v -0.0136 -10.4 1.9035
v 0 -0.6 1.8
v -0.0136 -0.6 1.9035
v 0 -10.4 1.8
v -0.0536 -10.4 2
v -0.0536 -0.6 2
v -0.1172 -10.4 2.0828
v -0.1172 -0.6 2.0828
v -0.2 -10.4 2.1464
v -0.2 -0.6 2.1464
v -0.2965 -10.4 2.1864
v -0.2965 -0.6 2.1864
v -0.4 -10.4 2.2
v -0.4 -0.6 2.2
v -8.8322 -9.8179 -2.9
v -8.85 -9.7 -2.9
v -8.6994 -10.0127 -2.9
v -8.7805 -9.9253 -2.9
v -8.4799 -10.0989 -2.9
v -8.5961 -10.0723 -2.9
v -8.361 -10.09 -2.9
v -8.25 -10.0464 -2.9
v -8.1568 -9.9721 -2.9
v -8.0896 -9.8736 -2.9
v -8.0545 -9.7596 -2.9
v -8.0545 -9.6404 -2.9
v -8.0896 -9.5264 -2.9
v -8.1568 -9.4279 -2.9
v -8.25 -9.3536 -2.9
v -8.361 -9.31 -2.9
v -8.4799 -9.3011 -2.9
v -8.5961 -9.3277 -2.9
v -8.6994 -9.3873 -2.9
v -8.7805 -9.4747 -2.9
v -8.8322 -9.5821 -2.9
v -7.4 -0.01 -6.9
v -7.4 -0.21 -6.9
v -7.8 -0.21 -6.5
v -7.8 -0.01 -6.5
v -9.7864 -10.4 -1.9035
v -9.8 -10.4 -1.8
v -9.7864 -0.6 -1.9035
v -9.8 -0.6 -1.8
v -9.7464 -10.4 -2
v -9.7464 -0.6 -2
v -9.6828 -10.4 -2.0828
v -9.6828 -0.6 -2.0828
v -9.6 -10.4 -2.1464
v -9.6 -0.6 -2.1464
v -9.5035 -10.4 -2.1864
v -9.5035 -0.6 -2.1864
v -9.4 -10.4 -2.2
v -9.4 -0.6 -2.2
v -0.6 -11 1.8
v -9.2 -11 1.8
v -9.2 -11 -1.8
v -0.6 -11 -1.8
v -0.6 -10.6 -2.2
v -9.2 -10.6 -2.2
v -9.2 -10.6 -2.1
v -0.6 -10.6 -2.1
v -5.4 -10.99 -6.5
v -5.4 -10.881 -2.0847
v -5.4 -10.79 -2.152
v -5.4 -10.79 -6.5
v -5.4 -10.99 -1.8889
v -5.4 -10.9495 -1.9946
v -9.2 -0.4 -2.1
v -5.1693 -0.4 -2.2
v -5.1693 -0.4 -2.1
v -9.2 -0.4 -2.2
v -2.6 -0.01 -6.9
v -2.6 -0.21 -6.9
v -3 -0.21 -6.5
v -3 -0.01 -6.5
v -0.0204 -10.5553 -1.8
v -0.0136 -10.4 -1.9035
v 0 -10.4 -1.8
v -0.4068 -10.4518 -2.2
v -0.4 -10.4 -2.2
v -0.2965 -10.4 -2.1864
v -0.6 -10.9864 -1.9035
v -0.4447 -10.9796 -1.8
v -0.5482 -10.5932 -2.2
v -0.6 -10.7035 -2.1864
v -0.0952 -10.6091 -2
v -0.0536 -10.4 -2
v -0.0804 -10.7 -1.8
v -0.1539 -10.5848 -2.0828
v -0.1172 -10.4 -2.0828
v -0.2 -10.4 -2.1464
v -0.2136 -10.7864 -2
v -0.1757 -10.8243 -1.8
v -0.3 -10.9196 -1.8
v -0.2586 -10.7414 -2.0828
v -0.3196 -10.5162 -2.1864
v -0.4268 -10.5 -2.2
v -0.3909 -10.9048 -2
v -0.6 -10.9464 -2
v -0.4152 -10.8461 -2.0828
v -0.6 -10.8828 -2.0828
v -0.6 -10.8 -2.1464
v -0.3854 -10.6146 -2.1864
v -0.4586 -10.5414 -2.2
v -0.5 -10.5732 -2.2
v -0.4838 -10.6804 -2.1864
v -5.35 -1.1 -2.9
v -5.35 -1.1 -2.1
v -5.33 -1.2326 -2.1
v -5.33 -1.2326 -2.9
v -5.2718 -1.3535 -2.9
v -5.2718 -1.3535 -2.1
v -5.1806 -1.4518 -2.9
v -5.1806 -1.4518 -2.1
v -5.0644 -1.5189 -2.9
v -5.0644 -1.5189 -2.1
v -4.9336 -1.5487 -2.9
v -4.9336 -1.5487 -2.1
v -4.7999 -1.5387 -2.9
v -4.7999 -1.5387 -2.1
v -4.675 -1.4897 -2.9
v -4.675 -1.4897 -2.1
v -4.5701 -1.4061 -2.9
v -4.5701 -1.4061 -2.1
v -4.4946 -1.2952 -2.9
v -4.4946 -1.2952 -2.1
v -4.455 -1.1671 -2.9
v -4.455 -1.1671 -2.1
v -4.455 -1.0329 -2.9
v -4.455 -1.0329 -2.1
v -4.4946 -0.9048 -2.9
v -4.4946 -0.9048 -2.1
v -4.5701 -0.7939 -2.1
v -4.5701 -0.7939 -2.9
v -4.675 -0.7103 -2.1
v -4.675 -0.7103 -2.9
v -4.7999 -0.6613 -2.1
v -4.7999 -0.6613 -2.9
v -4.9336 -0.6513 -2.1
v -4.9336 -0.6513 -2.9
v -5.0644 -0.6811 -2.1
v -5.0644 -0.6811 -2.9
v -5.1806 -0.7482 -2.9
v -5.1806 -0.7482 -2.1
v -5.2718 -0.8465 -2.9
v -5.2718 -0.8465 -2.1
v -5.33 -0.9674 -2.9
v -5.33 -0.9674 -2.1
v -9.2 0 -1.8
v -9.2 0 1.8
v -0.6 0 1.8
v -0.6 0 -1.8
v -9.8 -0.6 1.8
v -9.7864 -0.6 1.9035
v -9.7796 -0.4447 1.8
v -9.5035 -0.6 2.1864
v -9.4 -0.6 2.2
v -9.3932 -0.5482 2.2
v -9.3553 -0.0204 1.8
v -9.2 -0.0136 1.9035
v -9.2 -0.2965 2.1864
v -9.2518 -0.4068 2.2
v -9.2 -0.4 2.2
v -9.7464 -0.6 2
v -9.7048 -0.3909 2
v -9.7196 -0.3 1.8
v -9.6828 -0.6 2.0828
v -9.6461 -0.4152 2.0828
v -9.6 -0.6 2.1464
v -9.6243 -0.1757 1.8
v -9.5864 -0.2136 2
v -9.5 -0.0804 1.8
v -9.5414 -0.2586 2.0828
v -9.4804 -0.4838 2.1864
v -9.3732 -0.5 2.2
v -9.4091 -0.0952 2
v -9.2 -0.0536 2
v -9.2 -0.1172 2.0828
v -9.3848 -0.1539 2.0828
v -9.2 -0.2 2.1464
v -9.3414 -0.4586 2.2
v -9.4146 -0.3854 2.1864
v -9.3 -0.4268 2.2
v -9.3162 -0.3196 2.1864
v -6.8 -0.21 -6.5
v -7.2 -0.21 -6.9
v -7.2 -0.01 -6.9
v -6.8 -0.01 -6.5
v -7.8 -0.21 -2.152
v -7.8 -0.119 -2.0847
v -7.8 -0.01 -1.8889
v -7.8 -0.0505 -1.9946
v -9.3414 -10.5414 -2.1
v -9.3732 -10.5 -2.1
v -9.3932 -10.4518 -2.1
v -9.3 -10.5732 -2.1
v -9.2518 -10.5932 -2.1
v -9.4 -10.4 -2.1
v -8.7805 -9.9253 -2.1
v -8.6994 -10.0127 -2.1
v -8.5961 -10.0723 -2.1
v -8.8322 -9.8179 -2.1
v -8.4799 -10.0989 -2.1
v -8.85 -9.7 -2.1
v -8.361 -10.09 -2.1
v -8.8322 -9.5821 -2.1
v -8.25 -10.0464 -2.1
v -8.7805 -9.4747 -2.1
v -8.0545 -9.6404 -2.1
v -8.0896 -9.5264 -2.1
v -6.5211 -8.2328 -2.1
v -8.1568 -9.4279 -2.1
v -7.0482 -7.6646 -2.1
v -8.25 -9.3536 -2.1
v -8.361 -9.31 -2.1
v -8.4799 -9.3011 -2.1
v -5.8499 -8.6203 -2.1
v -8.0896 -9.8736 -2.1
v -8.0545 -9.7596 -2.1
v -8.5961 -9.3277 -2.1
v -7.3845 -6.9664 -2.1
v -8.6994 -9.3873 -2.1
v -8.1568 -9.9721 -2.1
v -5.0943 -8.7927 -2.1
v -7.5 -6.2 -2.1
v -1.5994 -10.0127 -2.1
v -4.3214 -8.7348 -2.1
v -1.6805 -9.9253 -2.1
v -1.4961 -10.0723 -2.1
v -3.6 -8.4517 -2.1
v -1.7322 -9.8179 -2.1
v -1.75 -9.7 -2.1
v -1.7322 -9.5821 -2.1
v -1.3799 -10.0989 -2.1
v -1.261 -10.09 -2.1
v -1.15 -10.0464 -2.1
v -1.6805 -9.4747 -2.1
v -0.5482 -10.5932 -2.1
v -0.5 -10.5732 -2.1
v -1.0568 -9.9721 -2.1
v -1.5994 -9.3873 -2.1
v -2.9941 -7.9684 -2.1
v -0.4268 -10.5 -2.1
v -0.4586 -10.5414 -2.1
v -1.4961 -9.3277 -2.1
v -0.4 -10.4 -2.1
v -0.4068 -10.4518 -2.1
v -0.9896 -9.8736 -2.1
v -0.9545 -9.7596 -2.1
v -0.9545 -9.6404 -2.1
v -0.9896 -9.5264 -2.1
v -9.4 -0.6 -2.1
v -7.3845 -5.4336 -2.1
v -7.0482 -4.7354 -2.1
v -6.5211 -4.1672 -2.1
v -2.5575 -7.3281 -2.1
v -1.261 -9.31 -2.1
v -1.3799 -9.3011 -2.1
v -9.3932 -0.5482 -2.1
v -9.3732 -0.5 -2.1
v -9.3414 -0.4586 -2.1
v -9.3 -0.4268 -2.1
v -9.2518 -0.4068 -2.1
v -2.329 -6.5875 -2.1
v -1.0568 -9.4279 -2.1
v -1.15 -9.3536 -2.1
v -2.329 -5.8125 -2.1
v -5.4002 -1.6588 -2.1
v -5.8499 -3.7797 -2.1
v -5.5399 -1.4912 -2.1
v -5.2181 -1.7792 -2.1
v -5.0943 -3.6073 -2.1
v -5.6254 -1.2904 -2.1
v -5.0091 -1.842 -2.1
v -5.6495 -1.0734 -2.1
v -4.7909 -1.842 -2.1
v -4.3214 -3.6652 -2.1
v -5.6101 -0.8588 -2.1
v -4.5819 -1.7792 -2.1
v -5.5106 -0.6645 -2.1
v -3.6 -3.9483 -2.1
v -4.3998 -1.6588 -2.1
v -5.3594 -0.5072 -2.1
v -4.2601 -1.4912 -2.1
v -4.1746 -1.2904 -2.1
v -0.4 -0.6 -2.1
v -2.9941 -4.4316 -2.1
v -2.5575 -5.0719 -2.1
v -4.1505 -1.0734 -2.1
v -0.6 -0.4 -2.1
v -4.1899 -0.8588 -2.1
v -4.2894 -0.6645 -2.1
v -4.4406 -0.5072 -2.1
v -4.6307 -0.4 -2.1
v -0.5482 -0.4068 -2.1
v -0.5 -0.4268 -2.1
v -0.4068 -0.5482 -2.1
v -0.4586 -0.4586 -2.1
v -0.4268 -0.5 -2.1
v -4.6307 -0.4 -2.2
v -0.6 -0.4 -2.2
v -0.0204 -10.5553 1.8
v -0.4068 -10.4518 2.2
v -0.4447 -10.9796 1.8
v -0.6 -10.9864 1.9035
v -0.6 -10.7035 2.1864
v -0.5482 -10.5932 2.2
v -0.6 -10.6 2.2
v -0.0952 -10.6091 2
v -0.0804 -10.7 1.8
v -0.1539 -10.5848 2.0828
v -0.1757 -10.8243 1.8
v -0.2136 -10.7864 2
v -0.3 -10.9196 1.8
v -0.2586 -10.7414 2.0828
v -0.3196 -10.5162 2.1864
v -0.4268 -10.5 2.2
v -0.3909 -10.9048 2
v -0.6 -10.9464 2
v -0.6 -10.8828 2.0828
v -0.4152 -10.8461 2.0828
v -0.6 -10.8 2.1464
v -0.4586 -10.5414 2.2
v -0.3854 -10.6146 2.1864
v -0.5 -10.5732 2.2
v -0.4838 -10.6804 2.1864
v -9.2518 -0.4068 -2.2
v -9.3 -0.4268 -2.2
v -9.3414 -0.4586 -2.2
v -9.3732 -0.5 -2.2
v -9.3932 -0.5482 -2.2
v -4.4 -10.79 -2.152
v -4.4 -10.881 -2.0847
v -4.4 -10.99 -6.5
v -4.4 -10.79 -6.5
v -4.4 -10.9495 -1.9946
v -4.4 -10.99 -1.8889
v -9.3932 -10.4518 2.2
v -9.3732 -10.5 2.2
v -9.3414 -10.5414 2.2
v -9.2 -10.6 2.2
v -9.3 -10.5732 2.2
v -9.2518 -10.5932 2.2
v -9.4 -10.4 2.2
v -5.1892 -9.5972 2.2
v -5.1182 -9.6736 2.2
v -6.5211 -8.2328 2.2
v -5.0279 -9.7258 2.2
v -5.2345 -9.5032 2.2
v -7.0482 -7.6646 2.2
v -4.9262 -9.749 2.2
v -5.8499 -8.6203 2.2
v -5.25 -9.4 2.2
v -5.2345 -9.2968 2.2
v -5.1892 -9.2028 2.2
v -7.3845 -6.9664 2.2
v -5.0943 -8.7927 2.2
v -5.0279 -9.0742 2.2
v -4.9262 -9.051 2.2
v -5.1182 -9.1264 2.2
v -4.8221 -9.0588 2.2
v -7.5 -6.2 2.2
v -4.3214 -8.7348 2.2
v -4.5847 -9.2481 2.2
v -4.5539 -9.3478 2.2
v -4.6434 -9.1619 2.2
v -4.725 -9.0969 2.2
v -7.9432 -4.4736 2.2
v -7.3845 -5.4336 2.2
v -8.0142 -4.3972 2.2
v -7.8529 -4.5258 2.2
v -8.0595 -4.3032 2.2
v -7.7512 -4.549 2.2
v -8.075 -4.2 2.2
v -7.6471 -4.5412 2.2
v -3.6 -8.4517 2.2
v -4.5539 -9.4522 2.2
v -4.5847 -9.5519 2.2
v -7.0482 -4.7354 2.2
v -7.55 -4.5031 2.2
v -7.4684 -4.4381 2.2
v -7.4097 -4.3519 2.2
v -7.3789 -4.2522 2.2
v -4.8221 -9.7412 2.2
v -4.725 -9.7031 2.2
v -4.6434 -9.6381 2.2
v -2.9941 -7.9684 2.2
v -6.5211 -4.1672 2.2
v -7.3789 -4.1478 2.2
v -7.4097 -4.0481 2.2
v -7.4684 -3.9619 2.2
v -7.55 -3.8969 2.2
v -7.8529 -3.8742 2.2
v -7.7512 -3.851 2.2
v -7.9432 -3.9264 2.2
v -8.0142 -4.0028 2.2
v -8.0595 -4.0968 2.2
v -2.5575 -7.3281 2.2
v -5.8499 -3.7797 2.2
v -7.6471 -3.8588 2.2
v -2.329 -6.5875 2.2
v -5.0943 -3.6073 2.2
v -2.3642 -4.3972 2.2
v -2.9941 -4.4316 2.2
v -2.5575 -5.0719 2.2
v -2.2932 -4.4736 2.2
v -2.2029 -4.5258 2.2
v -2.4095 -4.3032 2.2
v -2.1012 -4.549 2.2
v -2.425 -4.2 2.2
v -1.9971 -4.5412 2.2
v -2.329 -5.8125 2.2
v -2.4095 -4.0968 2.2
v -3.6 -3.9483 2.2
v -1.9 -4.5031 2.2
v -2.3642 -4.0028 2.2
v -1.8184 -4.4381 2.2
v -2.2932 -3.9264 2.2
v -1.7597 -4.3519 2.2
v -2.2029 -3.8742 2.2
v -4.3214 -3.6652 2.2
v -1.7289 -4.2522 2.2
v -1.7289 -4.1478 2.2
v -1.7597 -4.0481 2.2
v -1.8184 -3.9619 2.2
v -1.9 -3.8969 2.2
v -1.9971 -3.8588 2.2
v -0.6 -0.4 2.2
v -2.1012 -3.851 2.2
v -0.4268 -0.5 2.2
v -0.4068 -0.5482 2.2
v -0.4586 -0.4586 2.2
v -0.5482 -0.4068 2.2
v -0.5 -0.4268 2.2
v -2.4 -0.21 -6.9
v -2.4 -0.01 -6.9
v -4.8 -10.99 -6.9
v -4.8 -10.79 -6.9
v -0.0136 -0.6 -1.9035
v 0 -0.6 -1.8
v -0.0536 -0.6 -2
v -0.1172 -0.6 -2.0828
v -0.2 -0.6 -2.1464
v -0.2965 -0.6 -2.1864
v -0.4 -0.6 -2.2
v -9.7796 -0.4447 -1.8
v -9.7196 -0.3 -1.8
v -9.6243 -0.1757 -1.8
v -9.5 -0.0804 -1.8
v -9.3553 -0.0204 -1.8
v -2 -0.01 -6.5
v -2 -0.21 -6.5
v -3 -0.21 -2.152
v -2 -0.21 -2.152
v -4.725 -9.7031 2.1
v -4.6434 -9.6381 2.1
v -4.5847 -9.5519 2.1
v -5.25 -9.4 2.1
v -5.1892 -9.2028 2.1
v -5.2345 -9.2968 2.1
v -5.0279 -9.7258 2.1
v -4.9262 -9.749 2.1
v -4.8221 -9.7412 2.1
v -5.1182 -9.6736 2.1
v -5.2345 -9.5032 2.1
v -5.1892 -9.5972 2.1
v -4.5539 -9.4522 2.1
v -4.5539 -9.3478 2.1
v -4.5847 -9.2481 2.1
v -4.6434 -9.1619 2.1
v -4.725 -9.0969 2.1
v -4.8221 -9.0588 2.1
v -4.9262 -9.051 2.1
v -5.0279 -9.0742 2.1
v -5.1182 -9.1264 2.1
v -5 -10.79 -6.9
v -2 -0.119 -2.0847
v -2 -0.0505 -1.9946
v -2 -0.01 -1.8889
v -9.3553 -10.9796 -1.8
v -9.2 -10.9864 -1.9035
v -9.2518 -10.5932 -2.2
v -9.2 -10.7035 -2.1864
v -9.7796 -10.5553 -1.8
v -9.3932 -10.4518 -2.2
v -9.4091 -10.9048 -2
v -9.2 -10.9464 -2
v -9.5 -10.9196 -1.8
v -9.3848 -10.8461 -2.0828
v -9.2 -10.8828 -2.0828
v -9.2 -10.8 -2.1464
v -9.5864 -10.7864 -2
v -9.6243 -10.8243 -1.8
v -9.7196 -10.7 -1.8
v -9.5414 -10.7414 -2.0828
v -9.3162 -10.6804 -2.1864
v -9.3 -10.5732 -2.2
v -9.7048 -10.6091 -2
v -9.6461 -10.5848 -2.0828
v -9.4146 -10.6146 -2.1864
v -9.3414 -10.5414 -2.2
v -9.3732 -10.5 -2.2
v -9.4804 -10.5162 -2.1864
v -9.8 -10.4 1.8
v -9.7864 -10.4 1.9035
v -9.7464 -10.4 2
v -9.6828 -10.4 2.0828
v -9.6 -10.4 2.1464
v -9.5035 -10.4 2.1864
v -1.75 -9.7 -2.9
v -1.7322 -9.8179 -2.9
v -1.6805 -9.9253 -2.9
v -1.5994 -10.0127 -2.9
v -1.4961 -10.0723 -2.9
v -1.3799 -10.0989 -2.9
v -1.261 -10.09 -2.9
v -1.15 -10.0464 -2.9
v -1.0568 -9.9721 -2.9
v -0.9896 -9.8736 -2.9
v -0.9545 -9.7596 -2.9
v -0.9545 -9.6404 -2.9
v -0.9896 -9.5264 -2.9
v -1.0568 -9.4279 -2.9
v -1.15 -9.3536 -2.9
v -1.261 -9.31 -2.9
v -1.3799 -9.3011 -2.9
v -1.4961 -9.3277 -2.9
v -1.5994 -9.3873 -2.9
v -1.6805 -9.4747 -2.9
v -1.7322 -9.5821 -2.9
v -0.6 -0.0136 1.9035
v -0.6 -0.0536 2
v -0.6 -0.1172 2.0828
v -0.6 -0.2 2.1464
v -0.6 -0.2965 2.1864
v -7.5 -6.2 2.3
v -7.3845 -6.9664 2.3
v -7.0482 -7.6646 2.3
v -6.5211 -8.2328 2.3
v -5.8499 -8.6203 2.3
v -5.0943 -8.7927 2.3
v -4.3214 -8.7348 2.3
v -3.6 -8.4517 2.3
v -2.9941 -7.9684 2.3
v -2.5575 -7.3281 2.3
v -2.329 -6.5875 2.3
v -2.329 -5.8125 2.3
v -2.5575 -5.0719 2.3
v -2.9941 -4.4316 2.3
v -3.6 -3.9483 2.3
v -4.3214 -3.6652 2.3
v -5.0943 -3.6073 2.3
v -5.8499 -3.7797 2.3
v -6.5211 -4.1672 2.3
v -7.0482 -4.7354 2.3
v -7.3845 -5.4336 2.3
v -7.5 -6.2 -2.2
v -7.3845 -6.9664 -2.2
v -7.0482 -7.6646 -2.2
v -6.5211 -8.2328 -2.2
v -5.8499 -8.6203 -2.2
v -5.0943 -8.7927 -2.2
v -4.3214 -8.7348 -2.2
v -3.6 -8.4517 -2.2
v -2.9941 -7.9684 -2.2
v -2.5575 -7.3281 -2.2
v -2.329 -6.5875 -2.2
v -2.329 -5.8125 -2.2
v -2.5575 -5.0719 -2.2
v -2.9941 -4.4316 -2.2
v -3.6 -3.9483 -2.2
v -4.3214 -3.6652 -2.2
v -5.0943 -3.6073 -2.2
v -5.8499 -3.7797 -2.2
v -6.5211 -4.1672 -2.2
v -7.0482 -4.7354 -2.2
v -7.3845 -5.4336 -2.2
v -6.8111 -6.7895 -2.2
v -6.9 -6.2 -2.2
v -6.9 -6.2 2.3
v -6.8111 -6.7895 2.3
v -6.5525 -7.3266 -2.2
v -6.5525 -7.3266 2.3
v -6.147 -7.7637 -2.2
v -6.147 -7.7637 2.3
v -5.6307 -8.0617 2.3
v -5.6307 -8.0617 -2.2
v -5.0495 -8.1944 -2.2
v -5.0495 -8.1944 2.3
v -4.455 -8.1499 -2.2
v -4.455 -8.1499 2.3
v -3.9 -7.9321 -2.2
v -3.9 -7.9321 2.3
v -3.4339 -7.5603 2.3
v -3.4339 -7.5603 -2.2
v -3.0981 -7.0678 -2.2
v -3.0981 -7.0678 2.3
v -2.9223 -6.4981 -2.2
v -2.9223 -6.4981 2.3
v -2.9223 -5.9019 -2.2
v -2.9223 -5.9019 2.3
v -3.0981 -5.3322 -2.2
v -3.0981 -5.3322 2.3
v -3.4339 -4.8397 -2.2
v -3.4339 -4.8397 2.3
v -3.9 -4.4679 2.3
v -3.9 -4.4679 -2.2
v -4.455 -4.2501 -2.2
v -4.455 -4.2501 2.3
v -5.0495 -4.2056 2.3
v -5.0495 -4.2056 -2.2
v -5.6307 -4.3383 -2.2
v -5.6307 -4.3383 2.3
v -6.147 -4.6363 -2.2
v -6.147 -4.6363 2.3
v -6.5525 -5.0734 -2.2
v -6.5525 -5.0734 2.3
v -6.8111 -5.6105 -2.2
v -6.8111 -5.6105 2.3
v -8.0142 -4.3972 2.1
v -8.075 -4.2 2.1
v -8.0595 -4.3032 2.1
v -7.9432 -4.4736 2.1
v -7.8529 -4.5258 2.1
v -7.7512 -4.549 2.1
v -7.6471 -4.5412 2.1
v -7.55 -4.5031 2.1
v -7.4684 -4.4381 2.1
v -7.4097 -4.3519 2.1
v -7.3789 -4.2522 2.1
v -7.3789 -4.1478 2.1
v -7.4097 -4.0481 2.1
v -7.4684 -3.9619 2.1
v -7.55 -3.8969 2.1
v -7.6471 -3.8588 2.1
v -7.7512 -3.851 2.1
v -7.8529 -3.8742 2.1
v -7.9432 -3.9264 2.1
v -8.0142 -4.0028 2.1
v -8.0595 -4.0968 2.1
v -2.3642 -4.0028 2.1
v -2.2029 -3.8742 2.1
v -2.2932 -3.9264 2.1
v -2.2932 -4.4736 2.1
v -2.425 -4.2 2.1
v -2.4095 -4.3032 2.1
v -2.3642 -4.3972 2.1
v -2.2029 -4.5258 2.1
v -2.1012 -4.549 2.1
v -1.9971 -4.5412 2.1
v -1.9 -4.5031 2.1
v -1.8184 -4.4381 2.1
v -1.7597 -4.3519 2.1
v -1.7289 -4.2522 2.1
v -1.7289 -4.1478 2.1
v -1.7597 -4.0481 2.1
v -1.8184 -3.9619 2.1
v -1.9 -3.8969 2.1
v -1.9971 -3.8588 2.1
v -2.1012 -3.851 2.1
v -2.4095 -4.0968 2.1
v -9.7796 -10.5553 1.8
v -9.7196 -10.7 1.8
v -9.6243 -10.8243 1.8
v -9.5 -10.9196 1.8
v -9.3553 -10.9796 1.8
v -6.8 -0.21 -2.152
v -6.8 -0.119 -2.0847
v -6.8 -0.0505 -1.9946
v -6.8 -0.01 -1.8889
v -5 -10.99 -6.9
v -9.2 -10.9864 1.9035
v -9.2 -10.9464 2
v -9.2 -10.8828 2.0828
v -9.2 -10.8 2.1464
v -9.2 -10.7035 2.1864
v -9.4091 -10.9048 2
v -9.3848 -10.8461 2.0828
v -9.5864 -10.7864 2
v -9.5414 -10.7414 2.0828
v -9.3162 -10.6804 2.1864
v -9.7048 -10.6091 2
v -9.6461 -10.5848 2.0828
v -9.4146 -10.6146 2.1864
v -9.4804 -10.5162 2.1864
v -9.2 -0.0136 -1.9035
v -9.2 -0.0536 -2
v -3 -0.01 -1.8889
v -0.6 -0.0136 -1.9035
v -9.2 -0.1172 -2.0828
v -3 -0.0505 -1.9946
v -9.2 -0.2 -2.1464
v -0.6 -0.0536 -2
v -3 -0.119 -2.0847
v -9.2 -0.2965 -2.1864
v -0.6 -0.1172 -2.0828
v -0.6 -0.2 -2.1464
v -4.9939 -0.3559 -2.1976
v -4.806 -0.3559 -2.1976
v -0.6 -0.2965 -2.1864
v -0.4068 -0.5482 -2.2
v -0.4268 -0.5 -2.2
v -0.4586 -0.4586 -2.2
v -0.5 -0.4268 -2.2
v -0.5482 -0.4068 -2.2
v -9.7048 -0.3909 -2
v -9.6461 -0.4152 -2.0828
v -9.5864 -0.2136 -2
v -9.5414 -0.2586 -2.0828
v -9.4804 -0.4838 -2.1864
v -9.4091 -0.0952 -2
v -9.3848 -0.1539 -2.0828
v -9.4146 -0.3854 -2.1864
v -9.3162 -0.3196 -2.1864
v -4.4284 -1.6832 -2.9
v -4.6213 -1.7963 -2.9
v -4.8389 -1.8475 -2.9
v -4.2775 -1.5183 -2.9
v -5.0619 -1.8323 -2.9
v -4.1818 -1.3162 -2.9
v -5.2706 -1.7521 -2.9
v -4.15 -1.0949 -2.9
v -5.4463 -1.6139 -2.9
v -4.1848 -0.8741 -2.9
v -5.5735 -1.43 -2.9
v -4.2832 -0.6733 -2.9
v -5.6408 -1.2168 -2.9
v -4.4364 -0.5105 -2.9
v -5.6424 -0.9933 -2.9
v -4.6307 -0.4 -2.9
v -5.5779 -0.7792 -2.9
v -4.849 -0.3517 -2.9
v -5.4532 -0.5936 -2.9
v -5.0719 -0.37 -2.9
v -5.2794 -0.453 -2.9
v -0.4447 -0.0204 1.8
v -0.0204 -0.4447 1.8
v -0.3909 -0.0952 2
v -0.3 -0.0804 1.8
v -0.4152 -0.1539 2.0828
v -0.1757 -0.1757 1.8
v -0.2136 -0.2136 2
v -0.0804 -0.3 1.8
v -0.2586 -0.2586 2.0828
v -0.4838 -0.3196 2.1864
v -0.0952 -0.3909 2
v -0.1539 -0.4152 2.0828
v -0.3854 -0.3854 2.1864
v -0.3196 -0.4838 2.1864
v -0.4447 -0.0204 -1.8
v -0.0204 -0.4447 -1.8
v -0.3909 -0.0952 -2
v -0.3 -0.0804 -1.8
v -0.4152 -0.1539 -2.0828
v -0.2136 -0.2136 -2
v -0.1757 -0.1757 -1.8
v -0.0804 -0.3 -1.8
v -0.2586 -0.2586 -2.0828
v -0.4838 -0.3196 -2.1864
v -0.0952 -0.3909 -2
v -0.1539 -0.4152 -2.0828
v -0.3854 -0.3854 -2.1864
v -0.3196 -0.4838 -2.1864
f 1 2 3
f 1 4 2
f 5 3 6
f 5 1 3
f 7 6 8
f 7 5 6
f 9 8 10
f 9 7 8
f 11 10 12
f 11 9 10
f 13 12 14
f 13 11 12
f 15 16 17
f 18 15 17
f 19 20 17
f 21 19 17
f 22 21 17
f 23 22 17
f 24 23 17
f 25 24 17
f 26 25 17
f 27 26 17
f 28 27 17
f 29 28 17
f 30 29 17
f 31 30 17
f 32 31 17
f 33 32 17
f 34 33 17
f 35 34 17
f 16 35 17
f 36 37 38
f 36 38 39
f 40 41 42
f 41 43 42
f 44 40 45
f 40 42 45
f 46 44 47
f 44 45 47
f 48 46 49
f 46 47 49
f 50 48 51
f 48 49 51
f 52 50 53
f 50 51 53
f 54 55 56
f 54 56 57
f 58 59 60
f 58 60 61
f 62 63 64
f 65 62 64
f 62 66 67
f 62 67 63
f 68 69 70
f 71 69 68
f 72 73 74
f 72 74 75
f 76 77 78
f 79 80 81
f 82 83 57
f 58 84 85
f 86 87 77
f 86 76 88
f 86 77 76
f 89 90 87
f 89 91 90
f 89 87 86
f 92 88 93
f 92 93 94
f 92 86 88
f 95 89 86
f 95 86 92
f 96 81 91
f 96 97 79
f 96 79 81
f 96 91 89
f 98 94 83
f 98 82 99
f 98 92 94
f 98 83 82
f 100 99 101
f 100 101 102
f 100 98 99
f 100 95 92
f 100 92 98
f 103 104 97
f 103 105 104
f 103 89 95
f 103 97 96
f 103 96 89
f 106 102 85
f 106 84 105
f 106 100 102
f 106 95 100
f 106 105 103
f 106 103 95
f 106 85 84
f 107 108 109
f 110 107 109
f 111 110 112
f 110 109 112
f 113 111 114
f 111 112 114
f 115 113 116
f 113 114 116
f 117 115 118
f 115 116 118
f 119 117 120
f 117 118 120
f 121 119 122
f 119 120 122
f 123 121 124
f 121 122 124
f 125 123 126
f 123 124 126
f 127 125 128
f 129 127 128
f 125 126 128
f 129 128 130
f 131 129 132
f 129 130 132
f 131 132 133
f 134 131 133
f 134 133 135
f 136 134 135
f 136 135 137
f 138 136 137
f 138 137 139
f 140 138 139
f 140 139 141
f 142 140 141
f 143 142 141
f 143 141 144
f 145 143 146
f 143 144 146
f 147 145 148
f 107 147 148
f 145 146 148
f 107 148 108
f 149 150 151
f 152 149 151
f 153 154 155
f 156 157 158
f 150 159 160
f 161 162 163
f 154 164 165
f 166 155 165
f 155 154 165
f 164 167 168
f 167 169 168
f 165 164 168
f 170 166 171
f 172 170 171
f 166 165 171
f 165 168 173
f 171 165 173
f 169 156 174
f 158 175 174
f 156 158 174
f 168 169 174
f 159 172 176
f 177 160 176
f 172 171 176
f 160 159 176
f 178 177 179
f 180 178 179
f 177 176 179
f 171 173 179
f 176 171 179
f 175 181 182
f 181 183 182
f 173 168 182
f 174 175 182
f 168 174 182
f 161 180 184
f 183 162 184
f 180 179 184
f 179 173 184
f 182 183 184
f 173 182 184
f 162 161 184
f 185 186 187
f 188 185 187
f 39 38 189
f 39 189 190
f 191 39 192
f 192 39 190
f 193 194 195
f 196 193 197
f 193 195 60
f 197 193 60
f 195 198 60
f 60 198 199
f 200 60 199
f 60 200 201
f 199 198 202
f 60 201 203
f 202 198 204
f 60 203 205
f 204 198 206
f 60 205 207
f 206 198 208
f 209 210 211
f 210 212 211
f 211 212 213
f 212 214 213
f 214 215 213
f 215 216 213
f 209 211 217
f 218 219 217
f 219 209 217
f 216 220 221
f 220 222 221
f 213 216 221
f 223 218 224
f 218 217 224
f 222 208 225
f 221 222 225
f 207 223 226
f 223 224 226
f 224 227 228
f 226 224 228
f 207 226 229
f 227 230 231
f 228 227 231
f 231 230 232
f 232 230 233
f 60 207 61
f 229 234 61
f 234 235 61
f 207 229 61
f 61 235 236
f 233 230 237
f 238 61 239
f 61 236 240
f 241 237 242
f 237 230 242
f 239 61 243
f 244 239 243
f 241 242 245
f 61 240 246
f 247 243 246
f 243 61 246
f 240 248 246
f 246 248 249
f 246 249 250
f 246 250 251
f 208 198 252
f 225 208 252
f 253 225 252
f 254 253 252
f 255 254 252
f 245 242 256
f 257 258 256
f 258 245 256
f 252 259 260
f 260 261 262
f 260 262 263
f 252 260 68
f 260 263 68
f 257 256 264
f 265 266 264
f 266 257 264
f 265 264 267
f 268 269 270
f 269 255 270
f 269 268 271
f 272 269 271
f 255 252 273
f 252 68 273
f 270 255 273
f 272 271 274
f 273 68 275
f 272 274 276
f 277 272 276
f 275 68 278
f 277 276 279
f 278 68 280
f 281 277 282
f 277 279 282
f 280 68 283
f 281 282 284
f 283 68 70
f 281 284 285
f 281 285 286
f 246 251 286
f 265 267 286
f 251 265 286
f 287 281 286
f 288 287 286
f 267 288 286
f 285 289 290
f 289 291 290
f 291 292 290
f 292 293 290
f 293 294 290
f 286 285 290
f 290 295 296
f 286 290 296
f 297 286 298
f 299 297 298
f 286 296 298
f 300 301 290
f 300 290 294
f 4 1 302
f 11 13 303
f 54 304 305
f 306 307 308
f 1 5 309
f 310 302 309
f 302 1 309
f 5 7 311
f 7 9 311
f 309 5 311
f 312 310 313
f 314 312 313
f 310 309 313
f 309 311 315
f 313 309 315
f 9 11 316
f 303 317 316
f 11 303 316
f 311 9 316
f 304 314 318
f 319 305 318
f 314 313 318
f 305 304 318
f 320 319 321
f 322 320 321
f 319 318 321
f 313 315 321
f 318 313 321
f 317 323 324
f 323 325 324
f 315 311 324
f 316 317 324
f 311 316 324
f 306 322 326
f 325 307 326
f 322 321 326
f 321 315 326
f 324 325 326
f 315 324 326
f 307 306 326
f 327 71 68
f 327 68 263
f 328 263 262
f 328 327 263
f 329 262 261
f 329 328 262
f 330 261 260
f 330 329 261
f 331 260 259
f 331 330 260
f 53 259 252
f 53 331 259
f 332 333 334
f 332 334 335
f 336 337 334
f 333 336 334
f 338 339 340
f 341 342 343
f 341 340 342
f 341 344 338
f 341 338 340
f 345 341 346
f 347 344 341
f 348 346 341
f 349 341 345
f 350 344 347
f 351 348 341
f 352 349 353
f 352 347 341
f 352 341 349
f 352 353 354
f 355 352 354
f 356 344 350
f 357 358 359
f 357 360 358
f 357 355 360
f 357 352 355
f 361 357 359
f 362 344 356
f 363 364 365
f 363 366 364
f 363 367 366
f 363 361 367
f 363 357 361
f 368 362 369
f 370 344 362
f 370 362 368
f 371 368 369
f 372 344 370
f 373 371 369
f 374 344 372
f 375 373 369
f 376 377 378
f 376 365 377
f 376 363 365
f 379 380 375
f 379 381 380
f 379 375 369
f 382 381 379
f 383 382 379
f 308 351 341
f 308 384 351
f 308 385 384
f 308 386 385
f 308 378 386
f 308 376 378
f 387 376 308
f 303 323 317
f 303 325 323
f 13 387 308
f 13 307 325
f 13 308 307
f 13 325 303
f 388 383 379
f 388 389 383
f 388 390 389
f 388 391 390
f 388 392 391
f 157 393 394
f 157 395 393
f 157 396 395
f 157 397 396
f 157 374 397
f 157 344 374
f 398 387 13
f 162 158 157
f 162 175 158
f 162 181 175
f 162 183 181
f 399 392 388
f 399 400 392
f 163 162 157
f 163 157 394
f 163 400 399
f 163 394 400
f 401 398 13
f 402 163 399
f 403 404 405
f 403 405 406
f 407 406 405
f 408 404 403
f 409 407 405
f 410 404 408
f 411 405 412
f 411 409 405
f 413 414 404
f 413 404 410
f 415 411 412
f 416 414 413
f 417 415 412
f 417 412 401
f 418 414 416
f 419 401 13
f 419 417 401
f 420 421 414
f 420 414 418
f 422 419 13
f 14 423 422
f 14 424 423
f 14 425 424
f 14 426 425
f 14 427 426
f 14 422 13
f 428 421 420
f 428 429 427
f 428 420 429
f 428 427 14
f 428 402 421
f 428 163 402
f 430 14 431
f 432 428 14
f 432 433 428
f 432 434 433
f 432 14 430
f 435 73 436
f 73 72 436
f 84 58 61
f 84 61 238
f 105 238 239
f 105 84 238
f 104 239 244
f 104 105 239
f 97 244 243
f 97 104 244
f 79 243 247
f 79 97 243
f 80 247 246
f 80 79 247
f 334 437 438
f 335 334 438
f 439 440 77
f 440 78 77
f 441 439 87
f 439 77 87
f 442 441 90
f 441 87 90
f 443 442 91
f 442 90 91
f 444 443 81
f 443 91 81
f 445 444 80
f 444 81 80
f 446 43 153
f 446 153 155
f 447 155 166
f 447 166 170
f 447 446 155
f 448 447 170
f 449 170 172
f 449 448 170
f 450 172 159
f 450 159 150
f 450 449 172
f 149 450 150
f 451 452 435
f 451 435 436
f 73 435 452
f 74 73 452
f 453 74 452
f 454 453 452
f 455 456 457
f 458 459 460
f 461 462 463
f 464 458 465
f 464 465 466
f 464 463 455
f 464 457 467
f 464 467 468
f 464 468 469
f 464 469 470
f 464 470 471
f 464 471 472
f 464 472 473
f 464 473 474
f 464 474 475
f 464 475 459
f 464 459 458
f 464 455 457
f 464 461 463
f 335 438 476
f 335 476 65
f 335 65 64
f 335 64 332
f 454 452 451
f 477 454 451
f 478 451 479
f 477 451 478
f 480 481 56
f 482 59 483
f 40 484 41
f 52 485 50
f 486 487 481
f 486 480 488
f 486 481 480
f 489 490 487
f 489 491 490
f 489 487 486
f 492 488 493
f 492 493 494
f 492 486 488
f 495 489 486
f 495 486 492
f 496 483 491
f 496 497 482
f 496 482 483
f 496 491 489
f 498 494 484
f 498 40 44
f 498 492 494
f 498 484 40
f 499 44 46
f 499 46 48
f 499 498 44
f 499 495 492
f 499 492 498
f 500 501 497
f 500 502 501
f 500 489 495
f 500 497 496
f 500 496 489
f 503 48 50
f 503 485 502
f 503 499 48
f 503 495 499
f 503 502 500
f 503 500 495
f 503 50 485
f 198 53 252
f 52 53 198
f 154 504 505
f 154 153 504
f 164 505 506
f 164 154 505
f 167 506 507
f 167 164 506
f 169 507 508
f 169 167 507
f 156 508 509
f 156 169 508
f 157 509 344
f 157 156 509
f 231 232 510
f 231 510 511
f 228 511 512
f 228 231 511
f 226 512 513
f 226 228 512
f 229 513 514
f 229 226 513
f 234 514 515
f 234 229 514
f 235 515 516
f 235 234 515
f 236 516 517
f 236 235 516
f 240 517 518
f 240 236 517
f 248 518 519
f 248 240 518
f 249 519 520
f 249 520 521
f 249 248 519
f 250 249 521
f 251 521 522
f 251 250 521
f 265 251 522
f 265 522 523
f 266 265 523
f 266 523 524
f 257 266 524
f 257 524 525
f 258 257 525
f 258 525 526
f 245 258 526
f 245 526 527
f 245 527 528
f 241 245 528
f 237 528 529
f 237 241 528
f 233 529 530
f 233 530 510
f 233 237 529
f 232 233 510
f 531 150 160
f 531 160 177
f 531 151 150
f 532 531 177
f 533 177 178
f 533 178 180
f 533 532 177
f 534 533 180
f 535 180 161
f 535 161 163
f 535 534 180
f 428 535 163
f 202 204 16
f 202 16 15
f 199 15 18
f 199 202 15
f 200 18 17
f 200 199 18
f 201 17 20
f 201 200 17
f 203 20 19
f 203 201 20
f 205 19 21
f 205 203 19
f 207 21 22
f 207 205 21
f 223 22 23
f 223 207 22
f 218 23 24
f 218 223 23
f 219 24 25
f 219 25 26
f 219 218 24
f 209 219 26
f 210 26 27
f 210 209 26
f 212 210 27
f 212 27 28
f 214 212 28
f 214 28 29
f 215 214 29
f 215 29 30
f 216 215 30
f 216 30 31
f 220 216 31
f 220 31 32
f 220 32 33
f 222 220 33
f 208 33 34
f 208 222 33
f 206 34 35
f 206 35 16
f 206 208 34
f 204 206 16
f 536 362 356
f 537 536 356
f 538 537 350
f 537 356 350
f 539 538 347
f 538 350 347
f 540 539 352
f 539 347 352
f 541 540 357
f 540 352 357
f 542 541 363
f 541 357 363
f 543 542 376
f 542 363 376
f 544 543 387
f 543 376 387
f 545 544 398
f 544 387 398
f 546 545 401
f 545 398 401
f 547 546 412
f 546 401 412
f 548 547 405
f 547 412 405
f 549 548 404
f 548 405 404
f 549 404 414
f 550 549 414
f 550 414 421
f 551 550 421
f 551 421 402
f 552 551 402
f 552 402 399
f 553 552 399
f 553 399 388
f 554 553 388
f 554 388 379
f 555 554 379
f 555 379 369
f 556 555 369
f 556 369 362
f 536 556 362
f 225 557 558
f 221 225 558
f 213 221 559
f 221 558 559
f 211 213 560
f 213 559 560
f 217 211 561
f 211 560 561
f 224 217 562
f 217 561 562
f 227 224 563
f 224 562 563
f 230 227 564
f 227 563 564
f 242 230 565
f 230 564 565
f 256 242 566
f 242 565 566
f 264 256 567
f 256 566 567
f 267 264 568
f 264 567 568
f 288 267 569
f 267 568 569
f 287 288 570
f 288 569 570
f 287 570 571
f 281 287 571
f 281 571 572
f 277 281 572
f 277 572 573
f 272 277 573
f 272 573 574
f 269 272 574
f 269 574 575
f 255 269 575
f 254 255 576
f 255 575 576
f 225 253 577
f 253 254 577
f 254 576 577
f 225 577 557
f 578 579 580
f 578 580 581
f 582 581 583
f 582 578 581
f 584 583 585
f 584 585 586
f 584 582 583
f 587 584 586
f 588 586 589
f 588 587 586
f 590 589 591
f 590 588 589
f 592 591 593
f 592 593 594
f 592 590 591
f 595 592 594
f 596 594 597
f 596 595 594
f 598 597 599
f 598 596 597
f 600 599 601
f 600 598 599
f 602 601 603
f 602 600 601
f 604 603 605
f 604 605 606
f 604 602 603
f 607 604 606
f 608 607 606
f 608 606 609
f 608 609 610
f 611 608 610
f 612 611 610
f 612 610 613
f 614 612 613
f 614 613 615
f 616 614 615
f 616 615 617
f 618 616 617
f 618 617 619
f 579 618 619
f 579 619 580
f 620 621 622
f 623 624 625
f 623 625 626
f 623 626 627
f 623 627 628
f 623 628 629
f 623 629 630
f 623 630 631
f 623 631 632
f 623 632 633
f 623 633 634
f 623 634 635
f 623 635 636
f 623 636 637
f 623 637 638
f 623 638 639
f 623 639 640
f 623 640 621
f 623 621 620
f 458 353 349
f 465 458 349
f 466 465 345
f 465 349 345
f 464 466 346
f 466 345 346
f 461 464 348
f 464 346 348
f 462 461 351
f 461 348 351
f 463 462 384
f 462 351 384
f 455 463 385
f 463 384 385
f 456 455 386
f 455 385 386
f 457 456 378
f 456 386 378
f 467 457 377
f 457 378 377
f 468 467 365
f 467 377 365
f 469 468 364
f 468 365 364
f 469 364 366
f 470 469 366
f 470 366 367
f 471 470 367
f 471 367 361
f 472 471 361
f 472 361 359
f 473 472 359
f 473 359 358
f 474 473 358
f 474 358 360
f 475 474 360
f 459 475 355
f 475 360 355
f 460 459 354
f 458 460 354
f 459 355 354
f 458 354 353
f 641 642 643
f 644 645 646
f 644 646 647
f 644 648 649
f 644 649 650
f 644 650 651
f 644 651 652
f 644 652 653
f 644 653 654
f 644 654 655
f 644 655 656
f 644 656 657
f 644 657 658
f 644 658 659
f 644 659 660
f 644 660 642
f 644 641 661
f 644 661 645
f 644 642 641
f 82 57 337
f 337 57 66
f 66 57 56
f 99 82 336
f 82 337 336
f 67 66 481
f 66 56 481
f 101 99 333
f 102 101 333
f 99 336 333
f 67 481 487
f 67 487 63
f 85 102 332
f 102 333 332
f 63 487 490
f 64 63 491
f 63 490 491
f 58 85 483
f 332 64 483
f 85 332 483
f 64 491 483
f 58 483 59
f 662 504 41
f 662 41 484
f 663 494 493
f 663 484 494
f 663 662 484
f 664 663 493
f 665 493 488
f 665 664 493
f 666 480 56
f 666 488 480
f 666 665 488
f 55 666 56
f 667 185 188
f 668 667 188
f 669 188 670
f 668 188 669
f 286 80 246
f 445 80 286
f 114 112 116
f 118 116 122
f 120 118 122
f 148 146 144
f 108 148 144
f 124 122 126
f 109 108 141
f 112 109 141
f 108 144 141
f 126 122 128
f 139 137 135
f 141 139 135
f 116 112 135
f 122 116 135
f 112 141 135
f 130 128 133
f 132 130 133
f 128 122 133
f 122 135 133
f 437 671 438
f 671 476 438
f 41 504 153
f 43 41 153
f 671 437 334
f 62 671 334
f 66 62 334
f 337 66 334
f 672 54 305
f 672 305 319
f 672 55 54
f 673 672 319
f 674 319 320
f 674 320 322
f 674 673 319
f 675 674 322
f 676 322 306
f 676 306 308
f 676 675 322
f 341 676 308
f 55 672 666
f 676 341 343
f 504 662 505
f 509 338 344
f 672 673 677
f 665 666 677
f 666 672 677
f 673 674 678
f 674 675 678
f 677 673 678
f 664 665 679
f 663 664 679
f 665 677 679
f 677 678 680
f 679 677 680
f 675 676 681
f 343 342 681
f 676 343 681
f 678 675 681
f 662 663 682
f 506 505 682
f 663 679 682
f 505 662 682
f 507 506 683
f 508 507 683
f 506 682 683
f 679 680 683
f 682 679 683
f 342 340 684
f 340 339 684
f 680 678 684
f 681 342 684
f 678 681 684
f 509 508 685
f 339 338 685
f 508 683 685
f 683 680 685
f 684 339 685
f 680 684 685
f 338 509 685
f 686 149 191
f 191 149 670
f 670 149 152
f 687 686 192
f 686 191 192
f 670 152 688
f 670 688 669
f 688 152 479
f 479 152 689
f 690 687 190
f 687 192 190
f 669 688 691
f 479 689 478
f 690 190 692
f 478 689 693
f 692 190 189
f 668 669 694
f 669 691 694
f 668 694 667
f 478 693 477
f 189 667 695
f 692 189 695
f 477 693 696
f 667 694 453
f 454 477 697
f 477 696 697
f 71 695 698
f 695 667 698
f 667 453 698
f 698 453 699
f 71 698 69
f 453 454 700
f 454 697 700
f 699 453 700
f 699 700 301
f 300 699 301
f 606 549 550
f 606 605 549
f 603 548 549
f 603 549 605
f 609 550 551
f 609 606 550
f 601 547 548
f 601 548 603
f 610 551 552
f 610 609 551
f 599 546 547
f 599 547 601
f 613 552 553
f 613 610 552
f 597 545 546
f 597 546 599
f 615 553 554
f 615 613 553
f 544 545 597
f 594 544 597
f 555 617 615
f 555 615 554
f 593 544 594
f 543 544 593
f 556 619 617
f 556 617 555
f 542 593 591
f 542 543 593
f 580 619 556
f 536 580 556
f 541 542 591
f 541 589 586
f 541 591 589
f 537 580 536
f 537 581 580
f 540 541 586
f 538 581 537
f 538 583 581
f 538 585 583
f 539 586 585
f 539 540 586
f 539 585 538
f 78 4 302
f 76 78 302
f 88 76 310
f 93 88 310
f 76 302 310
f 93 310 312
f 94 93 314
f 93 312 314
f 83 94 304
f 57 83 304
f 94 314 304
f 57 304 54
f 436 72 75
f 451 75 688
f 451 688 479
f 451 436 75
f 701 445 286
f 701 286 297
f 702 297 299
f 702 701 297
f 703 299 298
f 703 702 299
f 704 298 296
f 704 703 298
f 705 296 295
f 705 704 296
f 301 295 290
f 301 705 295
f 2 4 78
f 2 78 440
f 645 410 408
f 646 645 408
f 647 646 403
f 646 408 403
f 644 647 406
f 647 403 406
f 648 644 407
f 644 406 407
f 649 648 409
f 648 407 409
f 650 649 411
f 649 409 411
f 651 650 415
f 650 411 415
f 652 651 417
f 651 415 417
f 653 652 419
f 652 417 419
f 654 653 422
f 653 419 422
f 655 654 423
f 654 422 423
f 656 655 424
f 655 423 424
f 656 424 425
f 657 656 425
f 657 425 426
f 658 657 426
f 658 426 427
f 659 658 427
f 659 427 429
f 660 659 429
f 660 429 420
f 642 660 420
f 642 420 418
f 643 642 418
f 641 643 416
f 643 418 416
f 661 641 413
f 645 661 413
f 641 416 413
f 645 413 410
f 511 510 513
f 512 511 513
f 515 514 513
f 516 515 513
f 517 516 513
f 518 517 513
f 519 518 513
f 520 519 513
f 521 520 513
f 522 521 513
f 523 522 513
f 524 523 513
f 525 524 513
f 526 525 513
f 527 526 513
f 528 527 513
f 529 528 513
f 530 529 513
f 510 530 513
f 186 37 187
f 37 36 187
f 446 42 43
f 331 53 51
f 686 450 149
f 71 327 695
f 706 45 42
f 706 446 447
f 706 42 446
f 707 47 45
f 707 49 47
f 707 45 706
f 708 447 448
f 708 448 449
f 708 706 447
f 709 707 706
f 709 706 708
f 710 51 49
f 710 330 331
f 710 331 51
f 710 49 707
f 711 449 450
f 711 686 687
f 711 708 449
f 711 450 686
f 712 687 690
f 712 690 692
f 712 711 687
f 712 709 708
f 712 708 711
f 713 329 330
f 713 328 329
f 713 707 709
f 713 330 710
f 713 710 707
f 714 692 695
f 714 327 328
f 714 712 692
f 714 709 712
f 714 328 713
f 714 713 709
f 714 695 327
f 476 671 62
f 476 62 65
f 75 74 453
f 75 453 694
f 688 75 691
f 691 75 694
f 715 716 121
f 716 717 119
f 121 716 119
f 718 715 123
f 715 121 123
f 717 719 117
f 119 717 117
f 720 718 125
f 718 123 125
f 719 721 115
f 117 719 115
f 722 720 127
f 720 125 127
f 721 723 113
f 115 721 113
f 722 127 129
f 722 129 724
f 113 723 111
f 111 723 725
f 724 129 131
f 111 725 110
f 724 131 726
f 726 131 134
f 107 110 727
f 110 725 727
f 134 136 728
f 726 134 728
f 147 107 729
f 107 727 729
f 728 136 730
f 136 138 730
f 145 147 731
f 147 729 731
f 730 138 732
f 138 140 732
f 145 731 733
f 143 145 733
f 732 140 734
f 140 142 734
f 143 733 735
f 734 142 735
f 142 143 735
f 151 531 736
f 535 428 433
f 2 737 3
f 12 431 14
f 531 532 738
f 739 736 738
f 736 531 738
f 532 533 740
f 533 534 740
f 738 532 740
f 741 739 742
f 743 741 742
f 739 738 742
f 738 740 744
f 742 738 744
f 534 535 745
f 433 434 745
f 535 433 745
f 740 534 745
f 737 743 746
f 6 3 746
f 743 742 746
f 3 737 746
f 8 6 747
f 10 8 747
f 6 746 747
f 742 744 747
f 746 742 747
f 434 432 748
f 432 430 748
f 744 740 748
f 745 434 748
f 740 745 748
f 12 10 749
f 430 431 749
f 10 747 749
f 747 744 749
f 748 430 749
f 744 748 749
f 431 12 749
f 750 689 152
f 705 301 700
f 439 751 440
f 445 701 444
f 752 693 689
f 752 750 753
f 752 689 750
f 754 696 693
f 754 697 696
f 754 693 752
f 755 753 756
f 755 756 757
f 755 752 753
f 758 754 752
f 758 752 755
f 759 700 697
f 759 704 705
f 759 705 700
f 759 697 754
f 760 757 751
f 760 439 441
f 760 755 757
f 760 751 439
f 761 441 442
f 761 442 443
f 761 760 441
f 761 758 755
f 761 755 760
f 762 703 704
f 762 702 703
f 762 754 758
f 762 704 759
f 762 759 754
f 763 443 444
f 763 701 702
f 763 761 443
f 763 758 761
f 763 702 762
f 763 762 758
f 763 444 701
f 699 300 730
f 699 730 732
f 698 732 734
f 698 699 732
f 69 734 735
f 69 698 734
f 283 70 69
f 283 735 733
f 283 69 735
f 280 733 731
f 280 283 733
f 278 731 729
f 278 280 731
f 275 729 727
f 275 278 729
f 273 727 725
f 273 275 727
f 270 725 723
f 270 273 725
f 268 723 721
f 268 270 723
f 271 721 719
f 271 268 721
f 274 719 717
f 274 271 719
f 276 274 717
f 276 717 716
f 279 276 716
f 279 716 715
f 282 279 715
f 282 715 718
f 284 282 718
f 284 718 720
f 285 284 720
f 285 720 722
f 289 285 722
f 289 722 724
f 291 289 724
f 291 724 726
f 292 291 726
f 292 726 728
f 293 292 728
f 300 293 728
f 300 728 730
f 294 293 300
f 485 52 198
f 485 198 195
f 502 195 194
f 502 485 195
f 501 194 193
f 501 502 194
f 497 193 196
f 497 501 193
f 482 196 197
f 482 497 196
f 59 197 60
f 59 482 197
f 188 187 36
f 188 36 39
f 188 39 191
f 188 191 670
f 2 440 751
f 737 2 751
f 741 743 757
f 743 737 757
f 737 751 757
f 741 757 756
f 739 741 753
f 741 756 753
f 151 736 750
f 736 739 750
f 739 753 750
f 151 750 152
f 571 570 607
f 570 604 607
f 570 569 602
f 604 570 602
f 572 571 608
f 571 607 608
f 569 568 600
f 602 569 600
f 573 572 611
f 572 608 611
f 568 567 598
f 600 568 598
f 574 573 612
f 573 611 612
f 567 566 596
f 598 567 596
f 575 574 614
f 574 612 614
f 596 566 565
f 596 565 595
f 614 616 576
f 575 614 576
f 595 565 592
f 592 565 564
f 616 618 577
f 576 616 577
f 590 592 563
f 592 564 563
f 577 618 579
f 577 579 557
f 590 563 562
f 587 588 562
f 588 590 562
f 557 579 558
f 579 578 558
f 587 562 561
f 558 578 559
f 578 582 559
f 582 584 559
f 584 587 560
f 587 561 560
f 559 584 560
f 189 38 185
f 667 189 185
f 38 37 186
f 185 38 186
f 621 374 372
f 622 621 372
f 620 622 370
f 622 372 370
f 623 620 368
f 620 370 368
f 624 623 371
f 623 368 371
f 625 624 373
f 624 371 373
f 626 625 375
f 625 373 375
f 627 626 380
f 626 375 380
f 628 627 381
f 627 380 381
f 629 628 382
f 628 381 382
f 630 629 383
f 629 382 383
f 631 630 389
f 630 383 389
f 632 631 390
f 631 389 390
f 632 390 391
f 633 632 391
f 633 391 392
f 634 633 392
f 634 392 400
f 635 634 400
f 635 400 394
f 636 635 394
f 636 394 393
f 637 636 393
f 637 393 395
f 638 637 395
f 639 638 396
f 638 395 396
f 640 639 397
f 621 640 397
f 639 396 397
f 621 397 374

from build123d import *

# Parameters (mm, degrees)
SKETCH1_W                         = 9.8
SKETCH1_H                         = 11
BOSS_EXTRUDE1_BODY_DEPTH          = 2.2
FILLET1_BODYCORNERS_R             = 0.6
FILLET2_BODYFACES_R               = 0.4
CUT_EXTRUDE2_BASEINDENT_START     = -2.2
CUT_EXTRUDE2_BASEINDENT_DEPTH     = 0.1
BOSS_EXTRUDE4_BASESTUDS_START     = -2.1
SKETCH5_R                         = 0.75
SKETCH5_R_2                       = 0.45
SKETCH5_R_3                       = 0.4
BOSS_EXTRUDE4_BASESTUDS_DEPTH     = 0.8
BOSS_EXTRUDE5_PINS_DEPTH          = 2.2
BOSS_EXTRUDE5_PINS_DEPTH_BACK     = 4.8
BOSS_EXTRUDE5_PINS_START          = -2.1
SKETCH6_W                         = 1
SKETCH6_H                         = 0.2
CHAMFER2_PINS_SIZE                = 0.4
BOSS_EXTRUDE6_KNOBEDGE_START      = -2.2
SKETCH7_R                         = 2.6
SKETCH7_R_2                       = 2
BOSS_EXTRUDE6_KNOBEDGE_DEPTH      = 4.5
CUT_EXTRUDE3_SHAFTHOLE_DEPTH      = 17.26806688
CUT_EXTRUDE3_SHAFTHOLE_DEPTH_BACK = 15.16806688
CUT_EXTRUDE3_SHAFTHOLE_START      = -2.1
SKETCH8_R                         = 2
CUT_EXTRUDE4_DETAIL_START         = 2.2
SKETCH9_R                         = 0.35
CUT_EXTRUDE4_DETAIL_DEPTH         = 0.1


with BuildPart() as part:
    # Sketch1 → Boss-Extrude1_Body (new, symmetric)
    with BuildSketch(Plane.XY):
        with Locations((-4.9, -5.5)):
            Rectangle(SKETCH1_W, SKETCH1_H)
    extrude(amount=BOSS_EXTRUDE1_BODY_DEPTH, both=True)

    # Fillet1_BodyCorners
    fillet1_bodycorners_edges = [part.edges().sort_by_distance(p)[0] for p in [
        (0, -11, 0),
        (-9.8, -11, 0),
        (-9.8, 0, 0),
        (0, 0, 0),
    ]]
    fillet(fillet1_bodycorners_edges, radius=FILLET1_BODYCORNERS_R)

    # Fillet2_BodyFaces
    fillet2_bodyfaces_edges = [part.edges().sort_by_distance(p)[0] for p in [
        (-9.8, -5.5, -2.2),
        (-9.8, -5.5, 2.2),
        (0, -5.5, -2.2),
        (-4.9, -11, -2.2),
        (-4.9, 0, -2.2),
        (-0.175735931, -0.175735931, -2.2),
        (-0.175735931, -10.824264069, -2.2),
        (-9.624264069, -10.824264069, -2.2),
        (-9.624264069, -0.175735931, -2.2),
        (-4.9, 0, 2.2),
        (0, -5.5, 2.2),
        (-4.9, -11, 2.2),
        (-0.175735931, -0.175735931, 2.2),
        (-0.175735931, -10.824264069, 2.2),
        (-9.624264069, -10.824264069, 2.2),
        (-9.624264069, -0.175735931, 2.2),
    ]]
    fillet(fillet2_bodyfaces_edges, radius=FILLET2_BODYFACES_R)

    # Sketch4 → Cut-Extrude2_BaseIndent (cut)
    with BuildSketch(Plane.XY.offset(CUT_EXTRUDE2_BASEINDENT_START)):
        with BuildLine():
            Line((-0.6, -0.4), (-9.2, -0.4))
            ThreePointArc((-9.2, -0.4), (-9.341421356, -0.458578644), (-9.4, -0.6))
            Line((-9.4, -0.6), (-9.4, -10.4))
            ThreePointArc((-9.4, -10.4), (-9.341421356, -10.541421356), (-9.2, -10.6))
            Line((-9.2, -10.6), (-0.6, -10.6))
            ThreePointArc((-0.6, -10.6), (-0.458578644, -10.541421356), (-0.4, -10.4))
            Line((-0.4, -10.4), (-0.4, -0.6))
            ThreePointArc((-0.4, -0.6), (-0.458578644, -0.458578644), (-0.6, -0.4))
        make_face()
    extrude(amount=CUT_EXTRUDE2_BASEINDENT_DEPTH, mode=Mode.SUBTRACT)

    # Sketch5 → Boss-Extrude4_BaseStuds (add)
    # profile 1 of 3: a face of its own
    with BuildSketch(Plane.XY.offset(BOSS_EXTRUDE4_BASESTUDS_START)):
        with Locations(Location((-4.9, -1.1, 0), (0, 0, 68.960530219))):
            Circle(SKETCH5_R)
        with Locations(Location((-4.9, -1.1, 0), (0, 0, 180))):
            Circle(SKETCH5_R_2, mode=Mode.SUBTRACT)
    # profile 2 of 3: a face of its own
    with BuildSketch(Plane.XY.offset(BOSS_EXTRUDE4_BASESTUDS_START)):
        with Locations(Location((-1.35, -9.7, 0), (0, 0, 180))):
            Circle(SKETCH5_R_3)
    # profile 3 of 3: a face of its own
    with BuildSketch(Plane.XY.offset(BOSS_EXTRUDE4_BASESTUDS_START)):
        with Locations(Location((-8.45, -9.7, 0), (0, 0, 180))):
            Circle(SKETCH5_R_3)
    extrude(amount=-BOSS_EXTRUDE4_BASESTUDS_DEPTH)

    # Sketch6 → Boss-Extrude5_Pins (add, two sides: drawn at the far end of the back side and taken through both)
    with BuildSketch(Plane.XY.offset(BOSS_EXTRUDE5_PINS_START - BOSS_EXTRUDE5_PINS_DEPTH_BACK)):
        with Locations((-2.5, -0.11)):
            Rectangle(SKETCH6_W, SKETCH6_H)
        with Locations((-7.3, -0.11)):
            Rectangle(SKETCH6_W, SKETCH6_H)
        with Locations((-4.9, -10.89)):
            Rectangle(SKETCH6_W, SKETCH6_H)
    extrude(amount=BOSS_EXTRUDE5_PINS_DEPTH + BOSS_EXTRUDE5_PINS_DEPTH_BACK)

    # Chamfer2_Pins
    chamfer2_pins_edges = [part.edges().sort_by_distance(p)[0] for p in [
        (-2, -0.11, -6.9),
        (-3, -0.11, -6.9),
        (-6.8, -0.11, -6.9),
        (-7.8, -0.11, -6.9),
        (-4.4, -10.89, -6.9),
        (-5.4, -10.89, -6.9),
    ]]
    chamfer(chamfer2_pins_edges, length=CHAMFER2_PINS_SIZE)

    # Sketch7 → Boss-Extrude6_KnobEdge (add)
    with BuildSketch(Plane.XY.offset(BOSS_EXTRUDE6_KNOBEDGE_START)):
        with Locations(Location((-4.9, -6.2, 0), (0, 0, 180))):
            Circle(SKETCH7_R)
        with Locations(Location((-4.9, -6.2, 0), (0, 0, 180))):
            Circle(SKETCH7_R_2, mode=Mode.SUBTRACT)
    extrude(amount=BOSS_EXTRUDE6_KNOBEDGE_DEPTH)

    # Sketch8 → Cut-Extrude3_ShaftHole (cut, two sides: drawn at the far end of the back side and taken through both)
    with BuildSketch(Plane.XY.offset(CUT_EXTRUDE3_SHAFTHOLE_START - CUT_EXTRUDE3_SHAFTHOLE_DEPTH_BACK)):
        with Locations(Location((-4.9, -6.2, 0), (0, 0, 180))):
            Circle(SKETCH8_R)
    extrude(amount=CUT_EXTRUDE3_SHAFTHOLE_DEPTH + CUT_EXTRUDE3_SHAFTHOLE_DEPTH_BACK, mode=Mode.SUBTRACT)

    # Sketch9 → Cut-Extrude4_Detail (cut)
    with BuildSketch(Plane.XY.offset(CUT_EXTRUDE4_DETAIL_START)):
        with Locations(Location((-7.725, -4.2, 0), (0, 0, 180))):
            Circle(SKETCH9_R)
        with Locations(Location((-2.075, -4.2, 0), (0, 0, 180))):
            Circle(SKETCH9_R)
        with Locations(Location((-4.9, -9.4, 0), (0, 0, 180))):
            Circle(SKETCH9_R)
    extrude(amount=-CUT_EXTRUDE4_DETAIL_DEPTH, mode=Mode.SUBTRACT)


solid = part.part
